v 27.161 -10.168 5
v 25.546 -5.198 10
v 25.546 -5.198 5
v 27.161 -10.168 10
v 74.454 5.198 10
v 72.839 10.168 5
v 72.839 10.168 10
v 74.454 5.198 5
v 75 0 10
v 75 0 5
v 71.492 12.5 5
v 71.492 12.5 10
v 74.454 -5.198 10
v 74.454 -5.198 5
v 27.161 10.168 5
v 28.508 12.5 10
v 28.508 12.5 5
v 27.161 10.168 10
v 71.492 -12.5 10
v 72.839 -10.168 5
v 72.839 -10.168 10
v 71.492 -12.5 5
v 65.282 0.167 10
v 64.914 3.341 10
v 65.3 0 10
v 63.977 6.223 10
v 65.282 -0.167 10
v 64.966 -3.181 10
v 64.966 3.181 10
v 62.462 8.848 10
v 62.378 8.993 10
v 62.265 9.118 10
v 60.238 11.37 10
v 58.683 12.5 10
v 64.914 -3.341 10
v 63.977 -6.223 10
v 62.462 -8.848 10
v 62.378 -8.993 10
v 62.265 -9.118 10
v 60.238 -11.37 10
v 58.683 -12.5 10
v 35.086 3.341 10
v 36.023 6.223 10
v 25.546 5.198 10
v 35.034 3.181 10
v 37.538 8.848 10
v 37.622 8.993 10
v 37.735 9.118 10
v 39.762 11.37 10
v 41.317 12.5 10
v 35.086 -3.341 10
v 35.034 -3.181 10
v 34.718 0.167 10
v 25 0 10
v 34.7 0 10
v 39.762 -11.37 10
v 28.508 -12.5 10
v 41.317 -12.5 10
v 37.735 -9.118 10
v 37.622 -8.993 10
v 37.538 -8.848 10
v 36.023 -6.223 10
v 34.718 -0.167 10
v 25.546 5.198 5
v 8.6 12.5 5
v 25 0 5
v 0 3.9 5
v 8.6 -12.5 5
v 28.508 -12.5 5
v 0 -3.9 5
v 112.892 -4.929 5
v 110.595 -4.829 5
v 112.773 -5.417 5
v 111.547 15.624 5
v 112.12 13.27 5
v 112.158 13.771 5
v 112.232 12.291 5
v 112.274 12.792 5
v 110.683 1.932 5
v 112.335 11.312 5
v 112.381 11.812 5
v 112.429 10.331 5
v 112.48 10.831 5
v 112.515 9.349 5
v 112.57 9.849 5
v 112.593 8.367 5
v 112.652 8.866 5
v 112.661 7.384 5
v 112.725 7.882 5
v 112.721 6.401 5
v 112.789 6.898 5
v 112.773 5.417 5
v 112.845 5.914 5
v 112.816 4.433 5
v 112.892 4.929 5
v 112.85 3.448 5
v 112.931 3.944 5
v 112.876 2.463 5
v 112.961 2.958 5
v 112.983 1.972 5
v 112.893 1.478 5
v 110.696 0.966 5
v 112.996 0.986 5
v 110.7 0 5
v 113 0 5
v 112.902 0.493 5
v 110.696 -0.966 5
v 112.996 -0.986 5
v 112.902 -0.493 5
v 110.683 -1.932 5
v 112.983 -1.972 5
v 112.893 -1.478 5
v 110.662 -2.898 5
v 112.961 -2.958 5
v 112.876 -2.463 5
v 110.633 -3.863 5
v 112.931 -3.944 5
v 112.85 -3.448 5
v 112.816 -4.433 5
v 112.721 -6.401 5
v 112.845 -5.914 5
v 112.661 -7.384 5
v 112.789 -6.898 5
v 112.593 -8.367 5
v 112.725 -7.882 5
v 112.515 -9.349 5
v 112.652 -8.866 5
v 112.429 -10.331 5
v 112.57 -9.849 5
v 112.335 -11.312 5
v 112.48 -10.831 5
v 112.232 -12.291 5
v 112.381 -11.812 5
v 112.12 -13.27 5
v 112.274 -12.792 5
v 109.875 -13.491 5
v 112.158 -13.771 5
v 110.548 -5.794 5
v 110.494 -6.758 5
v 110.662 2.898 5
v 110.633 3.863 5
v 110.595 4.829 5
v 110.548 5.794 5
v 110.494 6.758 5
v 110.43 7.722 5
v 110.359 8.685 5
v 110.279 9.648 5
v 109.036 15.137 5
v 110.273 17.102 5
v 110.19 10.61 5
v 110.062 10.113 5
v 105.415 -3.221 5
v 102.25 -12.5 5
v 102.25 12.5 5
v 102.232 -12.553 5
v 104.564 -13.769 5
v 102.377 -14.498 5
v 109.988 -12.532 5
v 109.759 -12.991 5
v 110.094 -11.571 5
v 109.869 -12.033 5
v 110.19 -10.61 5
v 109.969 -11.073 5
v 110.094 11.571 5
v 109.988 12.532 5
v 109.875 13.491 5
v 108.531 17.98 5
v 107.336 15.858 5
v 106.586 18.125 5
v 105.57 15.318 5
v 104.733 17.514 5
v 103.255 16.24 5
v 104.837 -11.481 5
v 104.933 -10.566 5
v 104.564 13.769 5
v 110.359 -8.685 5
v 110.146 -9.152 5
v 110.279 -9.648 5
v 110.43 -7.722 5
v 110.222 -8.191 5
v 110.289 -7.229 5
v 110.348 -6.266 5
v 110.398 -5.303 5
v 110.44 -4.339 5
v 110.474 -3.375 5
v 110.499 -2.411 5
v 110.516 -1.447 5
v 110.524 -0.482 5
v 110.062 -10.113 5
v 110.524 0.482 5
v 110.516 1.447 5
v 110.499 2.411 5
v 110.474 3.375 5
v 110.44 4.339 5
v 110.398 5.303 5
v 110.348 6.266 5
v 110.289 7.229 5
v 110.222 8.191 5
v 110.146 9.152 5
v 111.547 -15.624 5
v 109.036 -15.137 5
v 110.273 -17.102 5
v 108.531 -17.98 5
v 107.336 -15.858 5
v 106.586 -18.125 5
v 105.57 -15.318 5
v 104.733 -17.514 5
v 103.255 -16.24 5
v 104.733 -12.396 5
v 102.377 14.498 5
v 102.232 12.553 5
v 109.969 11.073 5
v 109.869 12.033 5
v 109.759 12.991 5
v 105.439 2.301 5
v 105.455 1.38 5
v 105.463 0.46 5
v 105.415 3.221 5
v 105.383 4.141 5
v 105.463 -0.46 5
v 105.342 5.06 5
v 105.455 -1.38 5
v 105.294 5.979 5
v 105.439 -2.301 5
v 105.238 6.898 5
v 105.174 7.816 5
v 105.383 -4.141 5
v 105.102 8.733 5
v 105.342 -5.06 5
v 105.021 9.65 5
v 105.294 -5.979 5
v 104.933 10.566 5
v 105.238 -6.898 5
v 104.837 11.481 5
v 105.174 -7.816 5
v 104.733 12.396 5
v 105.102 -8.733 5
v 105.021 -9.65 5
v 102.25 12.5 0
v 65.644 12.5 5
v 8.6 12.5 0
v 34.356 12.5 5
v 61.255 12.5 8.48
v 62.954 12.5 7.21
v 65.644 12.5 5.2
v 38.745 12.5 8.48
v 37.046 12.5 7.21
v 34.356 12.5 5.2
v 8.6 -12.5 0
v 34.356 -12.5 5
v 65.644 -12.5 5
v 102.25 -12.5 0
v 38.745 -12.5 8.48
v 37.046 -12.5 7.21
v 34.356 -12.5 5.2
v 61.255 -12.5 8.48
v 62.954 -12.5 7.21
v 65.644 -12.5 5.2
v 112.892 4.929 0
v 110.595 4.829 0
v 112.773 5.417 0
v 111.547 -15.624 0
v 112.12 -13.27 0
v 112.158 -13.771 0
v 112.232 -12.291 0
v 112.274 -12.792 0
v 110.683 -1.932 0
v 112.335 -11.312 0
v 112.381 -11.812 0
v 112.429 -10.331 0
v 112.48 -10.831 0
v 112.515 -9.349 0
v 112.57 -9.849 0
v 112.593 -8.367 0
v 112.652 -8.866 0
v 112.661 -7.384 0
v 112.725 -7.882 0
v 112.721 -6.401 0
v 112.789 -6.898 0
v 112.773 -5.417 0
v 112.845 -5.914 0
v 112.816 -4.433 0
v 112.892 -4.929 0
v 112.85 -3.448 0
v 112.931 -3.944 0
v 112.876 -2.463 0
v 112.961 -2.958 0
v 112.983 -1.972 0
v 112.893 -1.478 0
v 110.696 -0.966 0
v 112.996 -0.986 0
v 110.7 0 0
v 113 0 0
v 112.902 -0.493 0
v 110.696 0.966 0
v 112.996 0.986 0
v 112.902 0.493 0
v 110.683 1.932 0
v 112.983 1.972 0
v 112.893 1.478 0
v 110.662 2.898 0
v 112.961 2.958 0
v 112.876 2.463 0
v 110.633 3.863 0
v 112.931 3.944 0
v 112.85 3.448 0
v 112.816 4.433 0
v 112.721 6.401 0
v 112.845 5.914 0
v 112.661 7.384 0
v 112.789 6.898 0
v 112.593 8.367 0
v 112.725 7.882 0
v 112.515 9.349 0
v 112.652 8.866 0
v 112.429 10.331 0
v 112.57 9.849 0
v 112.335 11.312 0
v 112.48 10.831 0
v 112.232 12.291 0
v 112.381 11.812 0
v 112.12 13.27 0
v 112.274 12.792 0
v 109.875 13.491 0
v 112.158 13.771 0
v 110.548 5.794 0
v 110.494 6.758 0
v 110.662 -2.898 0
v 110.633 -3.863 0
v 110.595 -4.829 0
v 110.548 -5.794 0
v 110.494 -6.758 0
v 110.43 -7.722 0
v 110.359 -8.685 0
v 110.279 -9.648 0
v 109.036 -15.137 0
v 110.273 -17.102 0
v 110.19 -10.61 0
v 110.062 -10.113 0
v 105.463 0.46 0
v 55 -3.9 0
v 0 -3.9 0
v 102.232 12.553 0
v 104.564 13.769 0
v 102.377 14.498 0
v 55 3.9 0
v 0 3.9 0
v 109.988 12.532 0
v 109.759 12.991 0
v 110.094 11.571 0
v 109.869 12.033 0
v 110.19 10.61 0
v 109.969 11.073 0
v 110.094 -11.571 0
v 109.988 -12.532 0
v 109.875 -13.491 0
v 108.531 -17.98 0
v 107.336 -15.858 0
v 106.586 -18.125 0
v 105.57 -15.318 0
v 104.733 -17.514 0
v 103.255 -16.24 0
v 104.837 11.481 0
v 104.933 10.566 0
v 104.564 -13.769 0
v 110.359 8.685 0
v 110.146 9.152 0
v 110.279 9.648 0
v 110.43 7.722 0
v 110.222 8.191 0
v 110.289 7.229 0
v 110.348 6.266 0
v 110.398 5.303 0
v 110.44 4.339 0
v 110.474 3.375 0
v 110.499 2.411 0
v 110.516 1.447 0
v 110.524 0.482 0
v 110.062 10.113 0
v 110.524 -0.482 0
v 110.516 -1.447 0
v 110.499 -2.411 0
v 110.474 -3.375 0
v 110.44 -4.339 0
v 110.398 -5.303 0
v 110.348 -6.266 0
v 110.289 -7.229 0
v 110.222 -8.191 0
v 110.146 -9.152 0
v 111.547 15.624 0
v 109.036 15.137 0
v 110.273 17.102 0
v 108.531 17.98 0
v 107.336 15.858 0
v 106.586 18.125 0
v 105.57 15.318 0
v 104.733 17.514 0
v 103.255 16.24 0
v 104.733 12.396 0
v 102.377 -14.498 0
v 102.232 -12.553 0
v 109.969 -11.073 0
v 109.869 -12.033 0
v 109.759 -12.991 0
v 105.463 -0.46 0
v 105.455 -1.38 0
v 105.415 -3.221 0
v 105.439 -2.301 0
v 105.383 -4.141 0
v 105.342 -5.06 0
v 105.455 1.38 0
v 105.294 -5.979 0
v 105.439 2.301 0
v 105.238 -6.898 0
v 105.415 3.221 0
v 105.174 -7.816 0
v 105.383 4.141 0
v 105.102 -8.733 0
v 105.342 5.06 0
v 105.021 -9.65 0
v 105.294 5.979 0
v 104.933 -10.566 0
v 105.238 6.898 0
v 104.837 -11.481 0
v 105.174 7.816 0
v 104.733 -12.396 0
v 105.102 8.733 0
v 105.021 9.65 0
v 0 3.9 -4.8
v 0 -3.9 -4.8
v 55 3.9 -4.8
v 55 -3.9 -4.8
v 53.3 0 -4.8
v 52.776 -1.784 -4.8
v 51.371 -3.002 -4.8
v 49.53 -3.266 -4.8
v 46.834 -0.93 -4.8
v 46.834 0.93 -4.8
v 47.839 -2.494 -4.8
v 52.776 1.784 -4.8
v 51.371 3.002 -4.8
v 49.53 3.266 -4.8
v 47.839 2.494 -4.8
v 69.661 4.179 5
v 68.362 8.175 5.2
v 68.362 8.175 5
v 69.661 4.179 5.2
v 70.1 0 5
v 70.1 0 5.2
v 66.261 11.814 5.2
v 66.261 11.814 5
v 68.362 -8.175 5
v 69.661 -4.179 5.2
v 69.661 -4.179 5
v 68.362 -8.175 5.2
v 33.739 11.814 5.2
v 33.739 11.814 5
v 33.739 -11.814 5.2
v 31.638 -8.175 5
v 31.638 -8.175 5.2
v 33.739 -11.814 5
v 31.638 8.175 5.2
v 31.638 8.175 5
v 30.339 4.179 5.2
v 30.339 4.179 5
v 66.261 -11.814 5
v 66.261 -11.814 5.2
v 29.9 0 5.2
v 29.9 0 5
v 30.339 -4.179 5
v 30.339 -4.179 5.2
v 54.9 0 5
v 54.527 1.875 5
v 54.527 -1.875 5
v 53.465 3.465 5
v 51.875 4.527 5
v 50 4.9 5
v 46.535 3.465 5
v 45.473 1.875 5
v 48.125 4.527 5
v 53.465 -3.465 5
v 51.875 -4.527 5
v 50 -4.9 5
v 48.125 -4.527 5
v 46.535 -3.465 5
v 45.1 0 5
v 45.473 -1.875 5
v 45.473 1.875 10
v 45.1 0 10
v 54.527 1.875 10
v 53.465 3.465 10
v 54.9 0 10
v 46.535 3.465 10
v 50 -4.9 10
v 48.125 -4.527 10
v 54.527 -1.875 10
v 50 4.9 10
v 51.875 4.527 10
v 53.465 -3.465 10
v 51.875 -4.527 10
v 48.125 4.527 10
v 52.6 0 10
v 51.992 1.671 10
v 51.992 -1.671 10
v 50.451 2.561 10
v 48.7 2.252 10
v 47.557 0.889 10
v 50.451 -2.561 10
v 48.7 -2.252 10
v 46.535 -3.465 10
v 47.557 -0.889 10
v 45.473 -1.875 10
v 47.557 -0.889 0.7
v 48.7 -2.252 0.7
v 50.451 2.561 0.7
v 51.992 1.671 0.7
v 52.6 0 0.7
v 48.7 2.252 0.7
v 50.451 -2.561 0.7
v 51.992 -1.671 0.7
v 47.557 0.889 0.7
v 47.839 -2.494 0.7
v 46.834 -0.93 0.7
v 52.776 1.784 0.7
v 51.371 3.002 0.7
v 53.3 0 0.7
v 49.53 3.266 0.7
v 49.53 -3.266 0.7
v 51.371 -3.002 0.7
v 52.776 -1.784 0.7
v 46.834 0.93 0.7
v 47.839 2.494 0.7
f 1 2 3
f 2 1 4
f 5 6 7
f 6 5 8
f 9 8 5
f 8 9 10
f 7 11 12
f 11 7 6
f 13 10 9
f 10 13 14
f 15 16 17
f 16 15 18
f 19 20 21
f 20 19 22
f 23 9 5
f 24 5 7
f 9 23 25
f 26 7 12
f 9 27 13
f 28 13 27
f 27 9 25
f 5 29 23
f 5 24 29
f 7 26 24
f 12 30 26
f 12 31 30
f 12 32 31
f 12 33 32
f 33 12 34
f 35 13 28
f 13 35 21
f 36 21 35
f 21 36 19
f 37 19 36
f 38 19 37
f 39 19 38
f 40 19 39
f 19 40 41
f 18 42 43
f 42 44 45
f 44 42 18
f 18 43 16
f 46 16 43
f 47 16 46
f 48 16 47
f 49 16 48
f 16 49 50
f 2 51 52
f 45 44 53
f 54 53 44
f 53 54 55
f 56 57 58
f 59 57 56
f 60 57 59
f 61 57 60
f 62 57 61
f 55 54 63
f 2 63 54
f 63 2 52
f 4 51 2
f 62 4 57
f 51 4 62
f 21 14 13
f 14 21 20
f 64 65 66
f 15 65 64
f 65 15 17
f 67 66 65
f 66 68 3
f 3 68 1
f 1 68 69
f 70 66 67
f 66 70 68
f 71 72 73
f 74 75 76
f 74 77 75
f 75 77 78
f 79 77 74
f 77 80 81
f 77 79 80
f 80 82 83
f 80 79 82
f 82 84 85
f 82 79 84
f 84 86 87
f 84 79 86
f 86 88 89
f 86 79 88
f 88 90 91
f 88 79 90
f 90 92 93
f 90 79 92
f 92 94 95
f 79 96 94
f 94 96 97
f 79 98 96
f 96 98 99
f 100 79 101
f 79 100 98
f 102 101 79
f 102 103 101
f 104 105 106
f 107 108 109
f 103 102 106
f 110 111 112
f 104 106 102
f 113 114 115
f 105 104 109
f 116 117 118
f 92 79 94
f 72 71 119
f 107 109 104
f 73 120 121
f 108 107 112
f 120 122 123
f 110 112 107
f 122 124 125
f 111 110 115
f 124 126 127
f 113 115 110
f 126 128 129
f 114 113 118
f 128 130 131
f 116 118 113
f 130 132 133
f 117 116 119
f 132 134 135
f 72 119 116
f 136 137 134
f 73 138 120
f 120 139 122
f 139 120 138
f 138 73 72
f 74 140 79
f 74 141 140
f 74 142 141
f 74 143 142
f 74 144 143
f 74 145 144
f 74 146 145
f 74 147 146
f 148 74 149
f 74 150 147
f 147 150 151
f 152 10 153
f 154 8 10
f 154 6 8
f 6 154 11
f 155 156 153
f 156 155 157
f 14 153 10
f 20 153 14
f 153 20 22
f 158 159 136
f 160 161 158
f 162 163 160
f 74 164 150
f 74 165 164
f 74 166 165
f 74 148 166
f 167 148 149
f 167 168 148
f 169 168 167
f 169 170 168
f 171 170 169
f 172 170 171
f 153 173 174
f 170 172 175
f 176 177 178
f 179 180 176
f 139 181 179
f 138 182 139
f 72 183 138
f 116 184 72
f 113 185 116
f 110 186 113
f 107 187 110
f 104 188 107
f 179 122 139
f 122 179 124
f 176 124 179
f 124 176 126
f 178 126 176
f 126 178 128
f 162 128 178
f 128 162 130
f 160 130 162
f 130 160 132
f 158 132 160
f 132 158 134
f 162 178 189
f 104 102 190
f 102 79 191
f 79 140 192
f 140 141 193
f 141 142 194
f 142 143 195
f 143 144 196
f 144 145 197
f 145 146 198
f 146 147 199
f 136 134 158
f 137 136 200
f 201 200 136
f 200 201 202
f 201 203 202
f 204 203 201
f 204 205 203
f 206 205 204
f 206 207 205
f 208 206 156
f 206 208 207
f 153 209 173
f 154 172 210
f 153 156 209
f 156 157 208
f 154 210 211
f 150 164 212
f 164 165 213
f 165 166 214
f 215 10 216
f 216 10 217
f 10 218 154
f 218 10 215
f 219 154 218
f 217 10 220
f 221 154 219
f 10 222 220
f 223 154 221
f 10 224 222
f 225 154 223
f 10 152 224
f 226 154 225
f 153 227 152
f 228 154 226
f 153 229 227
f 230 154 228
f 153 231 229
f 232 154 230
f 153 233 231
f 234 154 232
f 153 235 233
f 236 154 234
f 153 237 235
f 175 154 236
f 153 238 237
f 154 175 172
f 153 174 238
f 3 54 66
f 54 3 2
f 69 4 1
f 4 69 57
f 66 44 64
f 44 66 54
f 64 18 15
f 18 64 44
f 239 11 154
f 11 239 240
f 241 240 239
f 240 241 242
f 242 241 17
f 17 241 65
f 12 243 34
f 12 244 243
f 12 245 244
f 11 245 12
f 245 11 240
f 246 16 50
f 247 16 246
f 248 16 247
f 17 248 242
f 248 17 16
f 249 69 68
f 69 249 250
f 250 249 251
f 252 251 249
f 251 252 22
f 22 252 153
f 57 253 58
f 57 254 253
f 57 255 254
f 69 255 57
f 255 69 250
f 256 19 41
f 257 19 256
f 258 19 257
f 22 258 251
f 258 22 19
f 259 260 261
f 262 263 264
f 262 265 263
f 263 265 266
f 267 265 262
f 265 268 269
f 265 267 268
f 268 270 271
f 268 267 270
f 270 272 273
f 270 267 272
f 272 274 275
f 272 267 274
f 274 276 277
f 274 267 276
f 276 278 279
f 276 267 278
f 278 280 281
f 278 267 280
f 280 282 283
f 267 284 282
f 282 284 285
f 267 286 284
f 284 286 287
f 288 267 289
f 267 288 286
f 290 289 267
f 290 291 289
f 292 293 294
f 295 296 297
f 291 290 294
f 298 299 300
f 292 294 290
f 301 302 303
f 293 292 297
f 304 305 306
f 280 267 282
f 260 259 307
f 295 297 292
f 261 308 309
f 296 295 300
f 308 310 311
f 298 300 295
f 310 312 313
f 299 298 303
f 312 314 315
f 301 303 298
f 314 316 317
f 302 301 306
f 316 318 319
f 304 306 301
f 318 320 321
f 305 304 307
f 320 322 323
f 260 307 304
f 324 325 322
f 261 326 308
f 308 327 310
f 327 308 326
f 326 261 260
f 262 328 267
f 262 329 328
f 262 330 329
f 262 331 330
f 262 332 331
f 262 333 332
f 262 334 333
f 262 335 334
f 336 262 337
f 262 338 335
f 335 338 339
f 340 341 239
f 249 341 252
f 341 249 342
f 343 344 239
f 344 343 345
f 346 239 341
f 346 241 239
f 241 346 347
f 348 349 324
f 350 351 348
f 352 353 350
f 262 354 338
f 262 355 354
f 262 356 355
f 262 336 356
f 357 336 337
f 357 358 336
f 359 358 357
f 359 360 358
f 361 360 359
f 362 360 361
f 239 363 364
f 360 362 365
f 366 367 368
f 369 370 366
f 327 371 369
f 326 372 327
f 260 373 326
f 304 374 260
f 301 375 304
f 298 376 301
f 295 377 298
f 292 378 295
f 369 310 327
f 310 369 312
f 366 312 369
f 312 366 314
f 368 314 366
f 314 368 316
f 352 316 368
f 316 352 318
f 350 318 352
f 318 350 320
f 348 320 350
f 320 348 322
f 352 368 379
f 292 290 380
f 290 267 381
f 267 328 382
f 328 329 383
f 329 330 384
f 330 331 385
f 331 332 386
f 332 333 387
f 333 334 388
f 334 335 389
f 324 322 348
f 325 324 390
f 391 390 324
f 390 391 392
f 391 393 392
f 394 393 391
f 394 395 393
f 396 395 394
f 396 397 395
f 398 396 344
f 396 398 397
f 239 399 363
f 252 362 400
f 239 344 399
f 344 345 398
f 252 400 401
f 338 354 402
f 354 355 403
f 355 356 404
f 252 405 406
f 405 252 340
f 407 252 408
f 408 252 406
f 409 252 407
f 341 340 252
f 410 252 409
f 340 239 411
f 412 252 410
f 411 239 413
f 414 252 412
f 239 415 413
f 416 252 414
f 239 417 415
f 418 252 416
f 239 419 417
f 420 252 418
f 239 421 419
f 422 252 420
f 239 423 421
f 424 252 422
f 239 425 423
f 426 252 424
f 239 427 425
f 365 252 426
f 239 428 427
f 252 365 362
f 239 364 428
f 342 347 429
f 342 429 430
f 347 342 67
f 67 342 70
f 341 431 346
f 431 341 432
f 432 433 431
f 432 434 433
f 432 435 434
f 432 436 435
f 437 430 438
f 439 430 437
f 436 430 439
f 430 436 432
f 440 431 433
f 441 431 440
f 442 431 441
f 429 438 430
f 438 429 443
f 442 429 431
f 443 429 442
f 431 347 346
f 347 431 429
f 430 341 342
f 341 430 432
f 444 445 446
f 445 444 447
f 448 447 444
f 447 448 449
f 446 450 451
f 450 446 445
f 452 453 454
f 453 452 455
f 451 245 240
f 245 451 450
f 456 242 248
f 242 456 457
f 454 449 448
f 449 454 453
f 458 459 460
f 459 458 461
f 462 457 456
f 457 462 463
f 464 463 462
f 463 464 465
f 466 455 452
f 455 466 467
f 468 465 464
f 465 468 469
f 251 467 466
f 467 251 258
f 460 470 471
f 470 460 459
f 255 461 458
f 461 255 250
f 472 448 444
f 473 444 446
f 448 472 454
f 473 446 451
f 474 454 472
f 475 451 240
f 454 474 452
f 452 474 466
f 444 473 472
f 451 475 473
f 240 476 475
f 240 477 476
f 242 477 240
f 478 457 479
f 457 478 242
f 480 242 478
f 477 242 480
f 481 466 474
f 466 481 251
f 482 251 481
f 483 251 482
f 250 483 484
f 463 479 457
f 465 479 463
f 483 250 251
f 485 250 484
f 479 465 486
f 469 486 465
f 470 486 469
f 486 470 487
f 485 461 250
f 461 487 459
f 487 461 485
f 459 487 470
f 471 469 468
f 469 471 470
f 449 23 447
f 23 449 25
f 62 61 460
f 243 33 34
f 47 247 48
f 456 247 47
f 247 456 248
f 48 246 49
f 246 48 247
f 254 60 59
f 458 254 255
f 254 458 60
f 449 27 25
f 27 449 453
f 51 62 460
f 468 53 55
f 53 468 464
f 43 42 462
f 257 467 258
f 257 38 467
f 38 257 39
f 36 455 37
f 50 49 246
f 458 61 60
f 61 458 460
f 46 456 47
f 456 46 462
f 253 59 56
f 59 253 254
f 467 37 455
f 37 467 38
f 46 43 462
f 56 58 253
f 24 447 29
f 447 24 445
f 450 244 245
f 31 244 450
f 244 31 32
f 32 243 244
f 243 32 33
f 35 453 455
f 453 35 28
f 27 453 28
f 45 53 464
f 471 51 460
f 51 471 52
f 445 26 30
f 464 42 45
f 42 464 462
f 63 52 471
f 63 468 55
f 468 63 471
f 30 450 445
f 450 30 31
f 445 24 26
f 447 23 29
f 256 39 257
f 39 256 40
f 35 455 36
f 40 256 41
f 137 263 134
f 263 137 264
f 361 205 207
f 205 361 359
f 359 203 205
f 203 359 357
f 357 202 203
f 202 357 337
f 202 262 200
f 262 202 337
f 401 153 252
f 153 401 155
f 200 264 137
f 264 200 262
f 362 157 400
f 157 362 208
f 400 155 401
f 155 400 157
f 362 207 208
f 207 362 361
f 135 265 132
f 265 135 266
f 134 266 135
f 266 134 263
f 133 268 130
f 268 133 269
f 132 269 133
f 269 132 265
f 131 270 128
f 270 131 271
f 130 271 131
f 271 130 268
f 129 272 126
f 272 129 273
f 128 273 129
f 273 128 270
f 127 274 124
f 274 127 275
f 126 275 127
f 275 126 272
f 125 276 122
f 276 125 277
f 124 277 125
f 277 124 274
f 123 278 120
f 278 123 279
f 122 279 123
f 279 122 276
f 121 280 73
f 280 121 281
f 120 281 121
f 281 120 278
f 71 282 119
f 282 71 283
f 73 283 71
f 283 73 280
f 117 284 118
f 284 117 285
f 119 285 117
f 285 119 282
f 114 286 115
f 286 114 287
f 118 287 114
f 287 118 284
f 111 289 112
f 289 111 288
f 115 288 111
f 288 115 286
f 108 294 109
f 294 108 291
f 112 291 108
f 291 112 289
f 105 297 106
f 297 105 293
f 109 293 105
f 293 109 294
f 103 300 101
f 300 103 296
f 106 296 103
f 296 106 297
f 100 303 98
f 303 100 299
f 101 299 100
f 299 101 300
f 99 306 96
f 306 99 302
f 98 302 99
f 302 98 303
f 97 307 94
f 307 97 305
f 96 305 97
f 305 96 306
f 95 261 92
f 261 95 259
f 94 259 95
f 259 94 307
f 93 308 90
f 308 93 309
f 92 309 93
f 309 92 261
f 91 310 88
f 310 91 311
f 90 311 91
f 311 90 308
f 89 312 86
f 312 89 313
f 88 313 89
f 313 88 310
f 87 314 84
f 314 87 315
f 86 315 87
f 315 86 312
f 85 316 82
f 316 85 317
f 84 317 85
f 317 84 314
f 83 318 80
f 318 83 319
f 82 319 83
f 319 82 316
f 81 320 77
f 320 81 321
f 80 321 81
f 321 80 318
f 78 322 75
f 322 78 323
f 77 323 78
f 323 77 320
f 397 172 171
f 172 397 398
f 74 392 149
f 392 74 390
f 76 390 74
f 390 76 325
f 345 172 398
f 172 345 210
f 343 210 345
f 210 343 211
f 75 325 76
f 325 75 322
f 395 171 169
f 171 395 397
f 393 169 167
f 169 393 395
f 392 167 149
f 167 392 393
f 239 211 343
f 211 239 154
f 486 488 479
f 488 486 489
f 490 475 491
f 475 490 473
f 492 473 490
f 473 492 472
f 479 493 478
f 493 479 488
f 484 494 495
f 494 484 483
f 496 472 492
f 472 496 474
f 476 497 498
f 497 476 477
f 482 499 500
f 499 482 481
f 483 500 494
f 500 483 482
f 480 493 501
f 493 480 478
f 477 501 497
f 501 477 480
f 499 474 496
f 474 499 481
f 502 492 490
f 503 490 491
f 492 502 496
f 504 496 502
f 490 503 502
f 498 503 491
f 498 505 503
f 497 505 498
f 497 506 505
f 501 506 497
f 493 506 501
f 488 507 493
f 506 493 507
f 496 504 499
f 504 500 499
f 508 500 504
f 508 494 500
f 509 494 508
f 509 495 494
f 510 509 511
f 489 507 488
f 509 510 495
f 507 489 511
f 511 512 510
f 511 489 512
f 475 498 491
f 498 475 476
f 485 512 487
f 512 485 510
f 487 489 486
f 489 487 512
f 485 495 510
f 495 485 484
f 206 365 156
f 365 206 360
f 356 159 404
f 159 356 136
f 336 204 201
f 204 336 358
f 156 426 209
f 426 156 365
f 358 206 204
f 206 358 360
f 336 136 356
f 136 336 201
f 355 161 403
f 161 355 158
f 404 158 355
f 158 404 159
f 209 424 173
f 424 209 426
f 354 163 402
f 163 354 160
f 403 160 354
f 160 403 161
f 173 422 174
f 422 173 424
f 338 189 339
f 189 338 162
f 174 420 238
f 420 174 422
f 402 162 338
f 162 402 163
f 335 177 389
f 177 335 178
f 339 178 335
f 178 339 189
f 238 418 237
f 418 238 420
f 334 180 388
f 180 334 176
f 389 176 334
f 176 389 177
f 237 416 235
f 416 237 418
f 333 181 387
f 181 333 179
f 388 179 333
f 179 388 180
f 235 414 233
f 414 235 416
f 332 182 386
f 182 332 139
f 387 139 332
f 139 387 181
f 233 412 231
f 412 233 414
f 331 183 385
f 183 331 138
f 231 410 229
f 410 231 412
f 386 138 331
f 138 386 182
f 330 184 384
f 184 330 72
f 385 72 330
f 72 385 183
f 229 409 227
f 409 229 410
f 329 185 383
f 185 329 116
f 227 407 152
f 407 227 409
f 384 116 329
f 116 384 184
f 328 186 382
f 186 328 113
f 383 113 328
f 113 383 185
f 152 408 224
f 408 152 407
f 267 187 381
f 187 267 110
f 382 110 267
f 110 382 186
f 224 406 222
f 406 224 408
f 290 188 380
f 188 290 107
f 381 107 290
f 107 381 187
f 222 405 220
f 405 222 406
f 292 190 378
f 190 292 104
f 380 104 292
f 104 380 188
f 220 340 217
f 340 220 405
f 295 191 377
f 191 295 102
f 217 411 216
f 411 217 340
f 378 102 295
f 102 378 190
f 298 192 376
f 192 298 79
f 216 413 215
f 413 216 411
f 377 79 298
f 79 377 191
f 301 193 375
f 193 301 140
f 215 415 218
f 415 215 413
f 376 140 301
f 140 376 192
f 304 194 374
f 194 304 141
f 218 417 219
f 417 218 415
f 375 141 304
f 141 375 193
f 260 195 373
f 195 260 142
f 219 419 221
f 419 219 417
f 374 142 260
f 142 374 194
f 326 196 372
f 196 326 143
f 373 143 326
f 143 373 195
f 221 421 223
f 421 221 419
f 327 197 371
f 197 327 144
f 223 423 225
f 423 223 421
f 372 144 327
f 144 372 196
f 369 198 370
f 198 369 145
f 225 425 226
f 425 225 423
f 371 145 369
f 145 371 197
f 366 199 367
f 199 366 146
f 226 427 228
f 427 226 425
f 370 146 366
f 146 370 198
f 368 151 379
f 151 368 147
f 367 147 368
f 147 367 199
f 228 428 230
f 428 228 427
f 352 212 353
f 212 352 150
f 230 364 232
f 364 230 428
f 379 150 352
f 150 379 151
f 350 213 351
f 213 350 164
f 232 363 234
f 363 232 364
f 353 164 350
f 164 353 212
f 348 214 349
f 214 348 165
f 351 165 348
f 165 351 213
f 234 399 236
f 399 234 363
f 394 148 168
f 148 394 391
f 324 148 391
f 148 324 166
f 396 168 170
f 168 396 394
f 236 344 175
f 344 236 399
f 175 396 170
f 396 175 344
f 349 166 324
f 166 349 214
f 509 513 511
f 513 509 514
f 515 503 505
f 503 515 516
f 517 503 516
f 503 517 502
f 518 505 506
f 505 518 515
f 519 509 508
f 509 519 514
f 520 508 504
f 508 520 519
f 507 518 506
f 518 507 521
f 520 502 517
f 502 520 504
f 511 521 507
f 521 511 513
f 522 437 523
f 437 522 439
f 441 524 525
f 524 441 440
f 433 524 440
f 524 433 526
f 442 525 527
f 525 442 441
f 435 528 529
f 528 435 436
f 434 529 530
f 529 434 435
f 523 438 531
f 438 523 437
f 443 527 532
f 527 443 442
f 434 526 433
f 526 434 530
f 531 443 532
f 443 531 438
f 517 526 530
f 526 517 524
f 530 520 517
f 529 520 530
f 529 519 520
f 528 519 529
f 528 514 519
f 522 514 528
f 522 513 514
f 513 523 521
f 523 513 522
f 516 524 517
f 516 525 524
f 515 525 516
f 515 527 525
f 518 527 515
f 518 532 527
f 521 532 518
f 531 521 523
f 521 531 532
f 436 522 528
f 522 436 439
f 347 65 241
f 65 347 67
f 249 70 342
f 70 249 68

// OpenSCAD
// file: config_4x5.scad
/*
This is the base configuration file for the 4x5" format
# we are not using the exact ANSI measures, but slightly rounded measures for slight simplification
*/
vStabilizerTotal_h = 7;

// general tolerance
vTolerance = 0.2;

// sheet film and cassette measurements (roughly based on the ANSI measurements)
vFilmSheet_l = 127;
vFilmSheet_w = 102;
vCassette_l = 160; // A min
vCassette_w = 121; // B max
vCassette_h = 13.2; // C max
vLightTrap_l = 2; // M2
vLightTrap_w = vCassette_w;
vLightTrap_h = 1.5; // M1
vLightTrap_offsetX = 141; // G max
vFilmWindow_l = 121;
vFilmWindow_w = 101;
vFilmWindow_offsetX = 16;
vGroundGlass_offsetZ = 5;

// Graflok
vGraflok_h = 6; // this is not the official measurement, just measured from a camera 

// lens board measures (we are using Wista/Technika-style lensboards)
vLensboard_l = 100;
vLensboard_w = 97;
vLensboard_h = 2;
vLensboard_offsetX = -(vLensboard_l+3)/2; // caution: we have an asymetric offset!
vLensboard_offsetY = -vLensboard_w/2;
vLensboardHole_d = 85;
vLensboardLighttrap_d = 89;
vLensboardLighttrap_h = 1+vTolerance;

// bellows frame measures - the bellows frame design is derived from standardcameras.com
// back frame
vBellowsBackInner_l = 144; //???? check and replace with the measurement from your bellows!
vBellowsBackInner_w = vBellowsBackInner_l;
vBellowsBackOuter_l = vBellowsBackInner_l+1;
vBellowsBackOuter_w = vBellowsBackOuter_l;

vBellowsBackFrameOuter_l = 159;
vBellowsBackFrameOuter_w = vBellowsBackFrameOuter_l;
vBellowsBackFrameOuter_h = 7;
vBellowsBackFrameInner_l = 135;
vBellowsBackFrameInner_w = vBellowsBackFrameInner_l;
vBellowsBackFrameInner_h = 5;

vBellowsBackLightTrapOuter_l = vBellowsBackFrameInner_l+2*2;
vBellowsBackLightTrapOuter_w = vBellowsBackLightTrapOuter_l;
vBellowsBackLightTrap_h = 3;

//vBellowsBackFrameScrewHole_d = 2;
//vBellowsBackFrameScrewHole_h = 10;
vBellowsBackFrameScrewHole_offsetXY = 70;
vBellowsBackFrameScrewHole_offsetZ = vBellowsBackFrameOuter_h/2;

// front frame
vBellowsFrontInner_l = 94; //???? check and replace with the measurement from your bellows!
vBellowsFrontInner_w = vBellowsFrontInner_l;
vBellowsFrontOuter_l = vBellowsFrontInner_l+1;
vBellowsFrontOuter_w = vBellowsFrontOuter_l;

vBellowsFrontFrameOuter_l = 104;
vBellowsFrontFrameOuter_w = vBellowsFrontFrameOuter_l;
vBellowsFrontFrameOuter_h = 7;
vBellowsFrontFrameInner_l = 82;
vBellowsFrontFrameInner_w = vBellowsFrontFrameInner_l;
vBellowsFrontFrameInner_h = 5;

vBellowsFrontLightTrapOuter_l = vBellowsFrontFrameInner_l+2*2;
vBellowsFrontLightTrapOuter_w = vBellowsFrontLightTrapOuter_l;
vBellowsFrontLightTrap_h = 0;

//vBellowsFrontFrameScrewHole_d = 2;
//vBellowsFrontFrameScrewHole_h = 10;
vBellowsFrontFrameScrewHole_offsetXY = 40;
vBellowsFrontFrameScrewHole_offsetZ = vBellowsFrontFrameOuter_h/2;

// body dimensions
vWall_strength = 5;
vBodyOuter_l = 185; // make sure this is at least 4*vWall_strength larger than vBellowsBackFrameOuter_l!
vBodyOuter_w = 170; // make sure this is at least 2*vWall_strength larger than vBellowsBackFrameOuter_l!
vBodyOuter_h = 65;
vBodyEdge_r = vWall_strength;

// we will center our model on the Y axis and on the center of the bellows frame
// at least for the 4x5 version, we have to do an asymetric offset of 2.5mm on the X-axis 
vAsymOffsetX = -2.5;  

// back plate
vBackPlateLength = 160; // we will probably use about the same size as the bellows back frame
vBackPlateStrength = vWall_strength;

// hinges for front lid
vHingeInnerDistance = 100;
vHingeBaseWidth = 20;
vHingeHole = 5;

// lid lock measures
vLidLockBase_d = 8;
vLidLockHole_distance = 70;

// rail dimensions
vLowerRail_w = 90;
vUpperRail_w = vLowerRail_w;

// cutout for stop indents
vStopIndent_l = 4;
vStopIndent_h = 5;
vStopIndentDistance = 25; // shorter than 25 is not necessary
vStopIndent_offsetX = 20; // don't go shorter than 20 if you intend to use a 90mm lens!

// for all dovetails we use a base width of 5mm and a base height of 5mm
// we are applying tolerances to the inner AND outer part of a dovetail, in width and height
vDoveTail_w = 5;
vDoveTail_h = 5;
vDoveTail_tolerance = 0.2;

// front standard carrier / slider
// width is depending on vUpperRail_w
vSliderBase_w = vUpperRail_w + (4*vDoveTail_w);
vSliderBase_l = 40; // make sure to have enough space in the body.


// lever plate 
vLeverPlateBase_w = vUpperRail_w - (8*vDoveTail_w);
vLeverPlateBlock_w = 25;
vLeverPlateBlock_l = vSliderBase_l-(2*vDoveTail_w);

vFrontStandard_h = 130;
vFrontStandardSlot_h = vFrontStandard_h - 30;

// lensboard carrier
vFrontPlate_length = vSliderBase_w+6; // vSliderBase_w is a bit too tight for 4x5", so there we will add 5mm, for 5x7 vSliderBase_w is OK to get a squared lensboard carrier
vFrontPlate_width = vSliderBase_w; //vFrontPlate_length;
vFrontPlate_height = 16;
vEdgeCutCylinder = floor(sqrt(2*pow(vFrontPlate_width,2)))-5;

vTiltDovetailBase_d1 = 30;
vTiltDovetailBase_d2 = vTiltDovetailBase_d1+(2*vDoveTail_w);
vTiltDovetailBaseBlock_d = vTiltDovetailBase_d1+(4*vDoveTail_w);

vTiltDovetail_d1 = vTiltDovetailBase_d1-vTolerance;
vTiltDovetail_d2 = vTiltDovetailBase_d2-vTolerance;
vTiltDovetail_h = vDoveTail_w-vTolerance;

vTiltDovetailCutout_d1 = vTiltDovetailBase_d2+vTolerance;
vTiltDovetailCutout_d2 = vTiltDovetailBase_d1+vTolerance;

vAxisHole_d = 10+vTolerance;
vAxisHole_h = vDoveTail_w+vTolerance;

vTiltLockBolt_d = 12;
vTiltLockBolt_h = 14;
vTiltLockBoltHole_d = 8;
vTiltLockBoltHole_h = vTiltLockBolt_h;

vTiltHeight = 50;
vTiltRadius = vFrontPlate_length/2;
vTiltAngleMinus = -7;
vTiltAnglePlus = 7;
vTiltAxis_d = 10-vTolerance;

// focusing rod
vFocusingRod_d = 6;
vFocusingKnob_d = 25;
vFocusingKnob_h = 20;

// stabilizer measures (just the outer measures of our stabilizer block, not the tripod slider)
vStabilizerBase_l = 135;
vStabilizerBase_w = 90;  
vStabilizerBase_h = 7;
vStabilizerDovetailBase_w = 50;
// screw holes for the stabilizer
vLidHoleCount_x = 4;
vLidHoleDist_x = 35;
vLidHoleCount_y = 2;
vLidHoleDist_y = 60;


// screw diameters, length is individually set
vScrew1Hole_d = 3;
vScrew1ThreadHole_d = 2.2;
vScrew2Hole_d = 2;
vScrew2ThreadHole_d = 1.4;


// Dimensions for heat set insert holes.
// Sized for "Voron standard" M3 inserts, 4 mm depth, 5 mm max OD
// (variously labelled M3x4x5 or M3x5x4)
vInsertHole_d = 4.0;
vInsertMinDepth_h = 5.0;

// Dimensions for small heat set insert holes.
// Sized for M2 inserts, 4 mm depth, 3.5 mm max OD
// (may be labelled M2x3.5x4)
vInsertHoleSmall_d = 3.1;
vInsertMinDepthSmall_h = 4.0;

// Dimensions for large heat set insert holes.
// Sized for M5 inserts, 5 mm depth, 7 mm max OD
// (may be labelled M5x7x5)
vInsertHoleLarge_d = 6.6;
vInsertMinDepthLarge_h = 5.5;
// file: modules.scad
/*
This is a collection of the modules which are used heavily within the whole project.
Almost all parts rely on the modules to remain "as is", especially regarding their current orientation.
So please act very carefully here, otherwise you may screw up the complete design!

*/

// roof module - this is heavily used for dovetail cutouts
// please keep as is
module roof(l, w, h){
    polyhedron(
        points=[
            [0,0,0],
            [l,0,0],
            [l,w,0],
            [0,w,0],
            [0,w/2,h],
            [l,w/2,h]
            ],
        faces=[
            [0,1,2,3],
            [0,4,1],
            [1,4,5,2],
            [2,5,3],
            [3,5,4,0]
            ]
            );
    };

// a wedge module - this is heavily used for cutting edges
// please keep as is    
module wedge(l, w, h) {
    polyhedron(
            points=[
                [0,0,0],
                [l,0,0],
                [l,w,0],
                [0,w,0],
                [0,0,h],
                [l,0,h]
            ],
            faces=[
                [0,3,2,1],
                [0,1,5,4],
                [1,2,5],
                [2,3,4,5],
                [3,0,4]
            ]
    );
   };

// simple tube module.   
module tube(d1, d2, h) {
    difference() {
        cylinder(d=d1, h=h);
        cylinder(d=d2, h=h);
        };
    };

// mainly used for making holes for countersunk screws
// please keep as is    
module countersunk_screw(vScrew_d, vScrew_l){
    union(){
    cylinder(d=vScrew_d, h= vScrew_l);
    cylinder(d1=vScrew_d*2, h=vScrew_d);
    };
};

// module for making hexagons, e.g. hex nuts. kw is the key width
// please keep as is
module hex(kw, h) {
	render()
        translate([0, 0, h/2])
            intersection_for(a = [0, 120, 240]) {
                rotate([0, 0, a])
                    cube([kw, 3 * kw, h], true);
                }
}

$fn=50;
// Countersunk screw, metric, for display
module screw(l, d=3, k=2.5, s=2, t=1) {
    // l: total length (including head) in mm
    // d: thread diameter (eg 3 for M3)
    // k: head depth
    // s: hex socket flat-to-flat size
    // t: hex socket depth
    difference() {
        union() {
            cylinder(h=l, r=d/2);
            cylinder(h=k, r1=d/2+k, r2=d/2);
            }
        cylinder(h=t, r=s/2*2/sqrt(3), $fn=6);
    }
}
// file: baseconfig.scad
/*
Here we define some variables which are independent from the camera format
*/


// some generic variables

// we are including a format specific configuration sheet - but make sure to include only one!

include <config_4x5.scad>;
// include <config_5x7.scad>;
// include <config_8x10.scad>;

// Arca Swiss tripod plate
// caution: some Arca Swiss compatible tripod heads may have slight variations
// vArca_length = xx; // the length is irrelevant here
vArca_width = 38;
vArca_height = 7;
vArcaBase_cutout = 4;
vArcaBase_height = 1.5;
// main file
// loading the base configuration
include <baseconfig.scad>;

// some modules such as hex, countersunk screws, roof, wedge are available in a module file
use <modules.scad>;

module front_standard_tilt_plate() {

// vTiltHeight = 45; // defined in config file

vTiltPlate_l = vTiltHeight + vTiltRadius;
vTiltPlate_w = 25;
vTiltPlate_h = 5;
vTiltPlate_offsetX = 0;
vTiltPlate_offsetY = -vTiltPlate_w/2;
vTiltPlate_offsetZ = 0;

// vTiltDovetailBaseBlock_d = 50; // defined in config file
vTiltDovetailBaseBlock_l = vTiltDovetailBaseBlock_d;
vTiltDovetailBaseBlock_w = vTiltPlate_w;
vTiltDovetailBaseBlock_h = vDoveTail_h;
vTiltDovetailBaseBlock_offsetX = vTiltHeight;
vTiltDovetailBaseBlock_offsetY = 0;
vTiltDovetailBaseBlock_offsetZ = vTiltPlate_h;

// vTiltDovetailCutout_d1 = 40+vTolerance; // defined in config file
// vTiltDovetailCutout_d2 = vTiltDovetailCutout_d1-(2*vDoveTail_w); // defined in config file
vTiltDovetailCutout_h = vDoveTail_h;
vTiltDovetailCutout_offsetX = vTiltHeight;
vTiltDovetailCutout_offsetY = 0;
vTiltDovetailCutout_offsetZ = vTiltPlate_h;

vRail_l = vTiltHeight+5;
vRail_w = 8-vTolerance;
vRail_h = 5-vTolerance;
vRail_offsetX = 0;
vRail_offsetY = -vRail_w/2;
vRail_offsetZ = -vRail_h;

//vTiltAxis_d = 10-vTolerance; // defined in config file
vTiltAxis_h = vTiltDovetailBaseBlock_h;
vTiltAxis_offsetX = vTiltHeight;
vTiltAxis_offsetY = 0;
vTiltAxis_offsetZ = vTiltPlate_h;

// Hole for the M5 bolt
vScrewHole_d = 5+vTolerance;
vScrewHole_h = vRail_h+vTiltPlate_h+vTiltDovetailBaseBlock_h;
vScrewHole_offsetX = vTiltHeight;
vScrewHole_offsetY = 0;
vScrewHole_offsetZ = vRail_offsetZ;

vTiltSlotPlate_d = 10;
vTiltSlot_d = 5+(2*vTolerance);
vTiltSlot_h = vTiltPlate_h;
vTiltSlot_offsetX = vTiltHeight+vTiltRadius;
vTiltSlot_offsetY = 0;
vTiltSlot_offsetZ = 0;
//vTiltAngleMinus = -6; // defined in config file
//vTiltAnglePlus = 6; // defined in config file

vEdgeCut = (vTiltPlate_w-vRail_w)/2;
vEdgeCut_h = vTiltPlate_h;
vEdgeCut_offsetX = 0;
vEdgeCut_offsetY = -vTiltPlate_w/2;
vEdgeCut_offsetZ = 0;

difference(){
    union(){
        difference(){
            union(){
                // base plate
                translate([vTiltPlate_offsetX, vTiltPlate_offsetY, vTiltPlate_offsetZ])
                    cube([vTiltPlate_l, vTiltPlate_w, vTiltPlate_h]);
                             
                // rail    
                translate([vRail_offsetX, vRail_offsetY, vRail_offsetZ])
                    cube([vRail_l, vRail_w, vRail_h]);    

                // dovetail block    
                translate([vTiltDovetailBaseBlock_offsetX, vTiltDovetailBaseBlock_offsetY, vTiltDovetailBaseBlock_offsetZ])
                intersection(){
                    translate([0, 0, 0])
                    cylinder(d=vTiltDovetailBaseBlock_d, h=vTiltDovetailBaseBlock_h);
                    translate([-vTiltDovetailBaseBlock_l/2, -vTiltDovetailBaseBlock_w/2, 0])
                        cube([vTiltDovetailBaseBlock_l, vTiltDovetailBaseBlock_w, vTiltDovetailBaseBlock_h]);
                    };
                };
            // tolerance cutout
            translate([vTiltDovetailCutout_offsetX, vTiltDovetailCutout_offsetY, vTiltDovetailCutout_offsetZ])
                cylinder(d=vTiltDovetailCutout_d1, h=vTolerance);
            // dovetail cutout
            translate([vTiltDovetailCutout_offsetX, vTiltDovetailCutout_offsetY, vTiltDovetailCutout_offsetZ+vTolerance])
                cylinder(d1=vTiltDovetailCutout_d1, d2=vTiltDovetailCutout_d2, h=vTiltDovetailCutout_h);
                
            
                
            };
                
        // tilt axis bolt
        translate([vTiltAxis_offsetX, vTiltAxis_offsetY, vTiltAxis_offsetZ])
            cylinder(d=vTiltAxis_d, h=vTiltAxis_h); 
        
        // tilt slot plate
        for (a =[vTiltAngleMinus:0.5:vTiltAnglePlus]){
            rotate([0, 0, a])
                translate([vTiltSlot_offsetX, vTiltSlot_offsetY, vTiltSlot_offsetZ])
                    cylinder(d=vTiltSlotPlate_d, h=vTiltSlot_h );
        };
           
    };
    
   
    // TODO: Heat set insert hole here. For M5 bolt.
    
    // Bolt thread hole
    translate([vScrewHole_offsetX, vScrewHole_offsetY, vScrewHole_offsetZ])
        cylinder(d=vScrewHole_d, h=vScrewHole_h);
    
    // Heat insert hole
    translate([vScrewHole_offsetX, vScrewHole_offsetY, vScrewHole_offsetZ])
        cylinder(d=vInsertHoleLarge_d, h=vInsertMinDepthLarge_h);
    
    // cutting the lower edges
    translate([vEdgeCut_offsetX, -vEdgeCut_offsetY, vEdgeCut_offsetZ])
        rotate([0, 270, 0])
            wedge(vEdgeCut_h, -vEdgeCut, -vEdgeCut);
    translate([vEdgeCut_offsetX, vEdgeCut_offsetY, vEdgeCut_offsetZ])
        rotate([0, 270, 0])
            wedge(vEdgeCut_h, vEdgeCut, -vEdgeCut);
    
    // tilt slot
        for (a =[vTiltAngleMinus:0.5:vTiltAnglePlus]){
            rotate([0, 0, a])
                translate([vTiltSlot_offsetX, vTiltSlot_offsetY, vTiltSlot_offsetZ])
                    cylinder(d=vTiltSlot_d, h=vTiltSlot_h );
        };
    
};

};

front_standard_tilt_plate();
